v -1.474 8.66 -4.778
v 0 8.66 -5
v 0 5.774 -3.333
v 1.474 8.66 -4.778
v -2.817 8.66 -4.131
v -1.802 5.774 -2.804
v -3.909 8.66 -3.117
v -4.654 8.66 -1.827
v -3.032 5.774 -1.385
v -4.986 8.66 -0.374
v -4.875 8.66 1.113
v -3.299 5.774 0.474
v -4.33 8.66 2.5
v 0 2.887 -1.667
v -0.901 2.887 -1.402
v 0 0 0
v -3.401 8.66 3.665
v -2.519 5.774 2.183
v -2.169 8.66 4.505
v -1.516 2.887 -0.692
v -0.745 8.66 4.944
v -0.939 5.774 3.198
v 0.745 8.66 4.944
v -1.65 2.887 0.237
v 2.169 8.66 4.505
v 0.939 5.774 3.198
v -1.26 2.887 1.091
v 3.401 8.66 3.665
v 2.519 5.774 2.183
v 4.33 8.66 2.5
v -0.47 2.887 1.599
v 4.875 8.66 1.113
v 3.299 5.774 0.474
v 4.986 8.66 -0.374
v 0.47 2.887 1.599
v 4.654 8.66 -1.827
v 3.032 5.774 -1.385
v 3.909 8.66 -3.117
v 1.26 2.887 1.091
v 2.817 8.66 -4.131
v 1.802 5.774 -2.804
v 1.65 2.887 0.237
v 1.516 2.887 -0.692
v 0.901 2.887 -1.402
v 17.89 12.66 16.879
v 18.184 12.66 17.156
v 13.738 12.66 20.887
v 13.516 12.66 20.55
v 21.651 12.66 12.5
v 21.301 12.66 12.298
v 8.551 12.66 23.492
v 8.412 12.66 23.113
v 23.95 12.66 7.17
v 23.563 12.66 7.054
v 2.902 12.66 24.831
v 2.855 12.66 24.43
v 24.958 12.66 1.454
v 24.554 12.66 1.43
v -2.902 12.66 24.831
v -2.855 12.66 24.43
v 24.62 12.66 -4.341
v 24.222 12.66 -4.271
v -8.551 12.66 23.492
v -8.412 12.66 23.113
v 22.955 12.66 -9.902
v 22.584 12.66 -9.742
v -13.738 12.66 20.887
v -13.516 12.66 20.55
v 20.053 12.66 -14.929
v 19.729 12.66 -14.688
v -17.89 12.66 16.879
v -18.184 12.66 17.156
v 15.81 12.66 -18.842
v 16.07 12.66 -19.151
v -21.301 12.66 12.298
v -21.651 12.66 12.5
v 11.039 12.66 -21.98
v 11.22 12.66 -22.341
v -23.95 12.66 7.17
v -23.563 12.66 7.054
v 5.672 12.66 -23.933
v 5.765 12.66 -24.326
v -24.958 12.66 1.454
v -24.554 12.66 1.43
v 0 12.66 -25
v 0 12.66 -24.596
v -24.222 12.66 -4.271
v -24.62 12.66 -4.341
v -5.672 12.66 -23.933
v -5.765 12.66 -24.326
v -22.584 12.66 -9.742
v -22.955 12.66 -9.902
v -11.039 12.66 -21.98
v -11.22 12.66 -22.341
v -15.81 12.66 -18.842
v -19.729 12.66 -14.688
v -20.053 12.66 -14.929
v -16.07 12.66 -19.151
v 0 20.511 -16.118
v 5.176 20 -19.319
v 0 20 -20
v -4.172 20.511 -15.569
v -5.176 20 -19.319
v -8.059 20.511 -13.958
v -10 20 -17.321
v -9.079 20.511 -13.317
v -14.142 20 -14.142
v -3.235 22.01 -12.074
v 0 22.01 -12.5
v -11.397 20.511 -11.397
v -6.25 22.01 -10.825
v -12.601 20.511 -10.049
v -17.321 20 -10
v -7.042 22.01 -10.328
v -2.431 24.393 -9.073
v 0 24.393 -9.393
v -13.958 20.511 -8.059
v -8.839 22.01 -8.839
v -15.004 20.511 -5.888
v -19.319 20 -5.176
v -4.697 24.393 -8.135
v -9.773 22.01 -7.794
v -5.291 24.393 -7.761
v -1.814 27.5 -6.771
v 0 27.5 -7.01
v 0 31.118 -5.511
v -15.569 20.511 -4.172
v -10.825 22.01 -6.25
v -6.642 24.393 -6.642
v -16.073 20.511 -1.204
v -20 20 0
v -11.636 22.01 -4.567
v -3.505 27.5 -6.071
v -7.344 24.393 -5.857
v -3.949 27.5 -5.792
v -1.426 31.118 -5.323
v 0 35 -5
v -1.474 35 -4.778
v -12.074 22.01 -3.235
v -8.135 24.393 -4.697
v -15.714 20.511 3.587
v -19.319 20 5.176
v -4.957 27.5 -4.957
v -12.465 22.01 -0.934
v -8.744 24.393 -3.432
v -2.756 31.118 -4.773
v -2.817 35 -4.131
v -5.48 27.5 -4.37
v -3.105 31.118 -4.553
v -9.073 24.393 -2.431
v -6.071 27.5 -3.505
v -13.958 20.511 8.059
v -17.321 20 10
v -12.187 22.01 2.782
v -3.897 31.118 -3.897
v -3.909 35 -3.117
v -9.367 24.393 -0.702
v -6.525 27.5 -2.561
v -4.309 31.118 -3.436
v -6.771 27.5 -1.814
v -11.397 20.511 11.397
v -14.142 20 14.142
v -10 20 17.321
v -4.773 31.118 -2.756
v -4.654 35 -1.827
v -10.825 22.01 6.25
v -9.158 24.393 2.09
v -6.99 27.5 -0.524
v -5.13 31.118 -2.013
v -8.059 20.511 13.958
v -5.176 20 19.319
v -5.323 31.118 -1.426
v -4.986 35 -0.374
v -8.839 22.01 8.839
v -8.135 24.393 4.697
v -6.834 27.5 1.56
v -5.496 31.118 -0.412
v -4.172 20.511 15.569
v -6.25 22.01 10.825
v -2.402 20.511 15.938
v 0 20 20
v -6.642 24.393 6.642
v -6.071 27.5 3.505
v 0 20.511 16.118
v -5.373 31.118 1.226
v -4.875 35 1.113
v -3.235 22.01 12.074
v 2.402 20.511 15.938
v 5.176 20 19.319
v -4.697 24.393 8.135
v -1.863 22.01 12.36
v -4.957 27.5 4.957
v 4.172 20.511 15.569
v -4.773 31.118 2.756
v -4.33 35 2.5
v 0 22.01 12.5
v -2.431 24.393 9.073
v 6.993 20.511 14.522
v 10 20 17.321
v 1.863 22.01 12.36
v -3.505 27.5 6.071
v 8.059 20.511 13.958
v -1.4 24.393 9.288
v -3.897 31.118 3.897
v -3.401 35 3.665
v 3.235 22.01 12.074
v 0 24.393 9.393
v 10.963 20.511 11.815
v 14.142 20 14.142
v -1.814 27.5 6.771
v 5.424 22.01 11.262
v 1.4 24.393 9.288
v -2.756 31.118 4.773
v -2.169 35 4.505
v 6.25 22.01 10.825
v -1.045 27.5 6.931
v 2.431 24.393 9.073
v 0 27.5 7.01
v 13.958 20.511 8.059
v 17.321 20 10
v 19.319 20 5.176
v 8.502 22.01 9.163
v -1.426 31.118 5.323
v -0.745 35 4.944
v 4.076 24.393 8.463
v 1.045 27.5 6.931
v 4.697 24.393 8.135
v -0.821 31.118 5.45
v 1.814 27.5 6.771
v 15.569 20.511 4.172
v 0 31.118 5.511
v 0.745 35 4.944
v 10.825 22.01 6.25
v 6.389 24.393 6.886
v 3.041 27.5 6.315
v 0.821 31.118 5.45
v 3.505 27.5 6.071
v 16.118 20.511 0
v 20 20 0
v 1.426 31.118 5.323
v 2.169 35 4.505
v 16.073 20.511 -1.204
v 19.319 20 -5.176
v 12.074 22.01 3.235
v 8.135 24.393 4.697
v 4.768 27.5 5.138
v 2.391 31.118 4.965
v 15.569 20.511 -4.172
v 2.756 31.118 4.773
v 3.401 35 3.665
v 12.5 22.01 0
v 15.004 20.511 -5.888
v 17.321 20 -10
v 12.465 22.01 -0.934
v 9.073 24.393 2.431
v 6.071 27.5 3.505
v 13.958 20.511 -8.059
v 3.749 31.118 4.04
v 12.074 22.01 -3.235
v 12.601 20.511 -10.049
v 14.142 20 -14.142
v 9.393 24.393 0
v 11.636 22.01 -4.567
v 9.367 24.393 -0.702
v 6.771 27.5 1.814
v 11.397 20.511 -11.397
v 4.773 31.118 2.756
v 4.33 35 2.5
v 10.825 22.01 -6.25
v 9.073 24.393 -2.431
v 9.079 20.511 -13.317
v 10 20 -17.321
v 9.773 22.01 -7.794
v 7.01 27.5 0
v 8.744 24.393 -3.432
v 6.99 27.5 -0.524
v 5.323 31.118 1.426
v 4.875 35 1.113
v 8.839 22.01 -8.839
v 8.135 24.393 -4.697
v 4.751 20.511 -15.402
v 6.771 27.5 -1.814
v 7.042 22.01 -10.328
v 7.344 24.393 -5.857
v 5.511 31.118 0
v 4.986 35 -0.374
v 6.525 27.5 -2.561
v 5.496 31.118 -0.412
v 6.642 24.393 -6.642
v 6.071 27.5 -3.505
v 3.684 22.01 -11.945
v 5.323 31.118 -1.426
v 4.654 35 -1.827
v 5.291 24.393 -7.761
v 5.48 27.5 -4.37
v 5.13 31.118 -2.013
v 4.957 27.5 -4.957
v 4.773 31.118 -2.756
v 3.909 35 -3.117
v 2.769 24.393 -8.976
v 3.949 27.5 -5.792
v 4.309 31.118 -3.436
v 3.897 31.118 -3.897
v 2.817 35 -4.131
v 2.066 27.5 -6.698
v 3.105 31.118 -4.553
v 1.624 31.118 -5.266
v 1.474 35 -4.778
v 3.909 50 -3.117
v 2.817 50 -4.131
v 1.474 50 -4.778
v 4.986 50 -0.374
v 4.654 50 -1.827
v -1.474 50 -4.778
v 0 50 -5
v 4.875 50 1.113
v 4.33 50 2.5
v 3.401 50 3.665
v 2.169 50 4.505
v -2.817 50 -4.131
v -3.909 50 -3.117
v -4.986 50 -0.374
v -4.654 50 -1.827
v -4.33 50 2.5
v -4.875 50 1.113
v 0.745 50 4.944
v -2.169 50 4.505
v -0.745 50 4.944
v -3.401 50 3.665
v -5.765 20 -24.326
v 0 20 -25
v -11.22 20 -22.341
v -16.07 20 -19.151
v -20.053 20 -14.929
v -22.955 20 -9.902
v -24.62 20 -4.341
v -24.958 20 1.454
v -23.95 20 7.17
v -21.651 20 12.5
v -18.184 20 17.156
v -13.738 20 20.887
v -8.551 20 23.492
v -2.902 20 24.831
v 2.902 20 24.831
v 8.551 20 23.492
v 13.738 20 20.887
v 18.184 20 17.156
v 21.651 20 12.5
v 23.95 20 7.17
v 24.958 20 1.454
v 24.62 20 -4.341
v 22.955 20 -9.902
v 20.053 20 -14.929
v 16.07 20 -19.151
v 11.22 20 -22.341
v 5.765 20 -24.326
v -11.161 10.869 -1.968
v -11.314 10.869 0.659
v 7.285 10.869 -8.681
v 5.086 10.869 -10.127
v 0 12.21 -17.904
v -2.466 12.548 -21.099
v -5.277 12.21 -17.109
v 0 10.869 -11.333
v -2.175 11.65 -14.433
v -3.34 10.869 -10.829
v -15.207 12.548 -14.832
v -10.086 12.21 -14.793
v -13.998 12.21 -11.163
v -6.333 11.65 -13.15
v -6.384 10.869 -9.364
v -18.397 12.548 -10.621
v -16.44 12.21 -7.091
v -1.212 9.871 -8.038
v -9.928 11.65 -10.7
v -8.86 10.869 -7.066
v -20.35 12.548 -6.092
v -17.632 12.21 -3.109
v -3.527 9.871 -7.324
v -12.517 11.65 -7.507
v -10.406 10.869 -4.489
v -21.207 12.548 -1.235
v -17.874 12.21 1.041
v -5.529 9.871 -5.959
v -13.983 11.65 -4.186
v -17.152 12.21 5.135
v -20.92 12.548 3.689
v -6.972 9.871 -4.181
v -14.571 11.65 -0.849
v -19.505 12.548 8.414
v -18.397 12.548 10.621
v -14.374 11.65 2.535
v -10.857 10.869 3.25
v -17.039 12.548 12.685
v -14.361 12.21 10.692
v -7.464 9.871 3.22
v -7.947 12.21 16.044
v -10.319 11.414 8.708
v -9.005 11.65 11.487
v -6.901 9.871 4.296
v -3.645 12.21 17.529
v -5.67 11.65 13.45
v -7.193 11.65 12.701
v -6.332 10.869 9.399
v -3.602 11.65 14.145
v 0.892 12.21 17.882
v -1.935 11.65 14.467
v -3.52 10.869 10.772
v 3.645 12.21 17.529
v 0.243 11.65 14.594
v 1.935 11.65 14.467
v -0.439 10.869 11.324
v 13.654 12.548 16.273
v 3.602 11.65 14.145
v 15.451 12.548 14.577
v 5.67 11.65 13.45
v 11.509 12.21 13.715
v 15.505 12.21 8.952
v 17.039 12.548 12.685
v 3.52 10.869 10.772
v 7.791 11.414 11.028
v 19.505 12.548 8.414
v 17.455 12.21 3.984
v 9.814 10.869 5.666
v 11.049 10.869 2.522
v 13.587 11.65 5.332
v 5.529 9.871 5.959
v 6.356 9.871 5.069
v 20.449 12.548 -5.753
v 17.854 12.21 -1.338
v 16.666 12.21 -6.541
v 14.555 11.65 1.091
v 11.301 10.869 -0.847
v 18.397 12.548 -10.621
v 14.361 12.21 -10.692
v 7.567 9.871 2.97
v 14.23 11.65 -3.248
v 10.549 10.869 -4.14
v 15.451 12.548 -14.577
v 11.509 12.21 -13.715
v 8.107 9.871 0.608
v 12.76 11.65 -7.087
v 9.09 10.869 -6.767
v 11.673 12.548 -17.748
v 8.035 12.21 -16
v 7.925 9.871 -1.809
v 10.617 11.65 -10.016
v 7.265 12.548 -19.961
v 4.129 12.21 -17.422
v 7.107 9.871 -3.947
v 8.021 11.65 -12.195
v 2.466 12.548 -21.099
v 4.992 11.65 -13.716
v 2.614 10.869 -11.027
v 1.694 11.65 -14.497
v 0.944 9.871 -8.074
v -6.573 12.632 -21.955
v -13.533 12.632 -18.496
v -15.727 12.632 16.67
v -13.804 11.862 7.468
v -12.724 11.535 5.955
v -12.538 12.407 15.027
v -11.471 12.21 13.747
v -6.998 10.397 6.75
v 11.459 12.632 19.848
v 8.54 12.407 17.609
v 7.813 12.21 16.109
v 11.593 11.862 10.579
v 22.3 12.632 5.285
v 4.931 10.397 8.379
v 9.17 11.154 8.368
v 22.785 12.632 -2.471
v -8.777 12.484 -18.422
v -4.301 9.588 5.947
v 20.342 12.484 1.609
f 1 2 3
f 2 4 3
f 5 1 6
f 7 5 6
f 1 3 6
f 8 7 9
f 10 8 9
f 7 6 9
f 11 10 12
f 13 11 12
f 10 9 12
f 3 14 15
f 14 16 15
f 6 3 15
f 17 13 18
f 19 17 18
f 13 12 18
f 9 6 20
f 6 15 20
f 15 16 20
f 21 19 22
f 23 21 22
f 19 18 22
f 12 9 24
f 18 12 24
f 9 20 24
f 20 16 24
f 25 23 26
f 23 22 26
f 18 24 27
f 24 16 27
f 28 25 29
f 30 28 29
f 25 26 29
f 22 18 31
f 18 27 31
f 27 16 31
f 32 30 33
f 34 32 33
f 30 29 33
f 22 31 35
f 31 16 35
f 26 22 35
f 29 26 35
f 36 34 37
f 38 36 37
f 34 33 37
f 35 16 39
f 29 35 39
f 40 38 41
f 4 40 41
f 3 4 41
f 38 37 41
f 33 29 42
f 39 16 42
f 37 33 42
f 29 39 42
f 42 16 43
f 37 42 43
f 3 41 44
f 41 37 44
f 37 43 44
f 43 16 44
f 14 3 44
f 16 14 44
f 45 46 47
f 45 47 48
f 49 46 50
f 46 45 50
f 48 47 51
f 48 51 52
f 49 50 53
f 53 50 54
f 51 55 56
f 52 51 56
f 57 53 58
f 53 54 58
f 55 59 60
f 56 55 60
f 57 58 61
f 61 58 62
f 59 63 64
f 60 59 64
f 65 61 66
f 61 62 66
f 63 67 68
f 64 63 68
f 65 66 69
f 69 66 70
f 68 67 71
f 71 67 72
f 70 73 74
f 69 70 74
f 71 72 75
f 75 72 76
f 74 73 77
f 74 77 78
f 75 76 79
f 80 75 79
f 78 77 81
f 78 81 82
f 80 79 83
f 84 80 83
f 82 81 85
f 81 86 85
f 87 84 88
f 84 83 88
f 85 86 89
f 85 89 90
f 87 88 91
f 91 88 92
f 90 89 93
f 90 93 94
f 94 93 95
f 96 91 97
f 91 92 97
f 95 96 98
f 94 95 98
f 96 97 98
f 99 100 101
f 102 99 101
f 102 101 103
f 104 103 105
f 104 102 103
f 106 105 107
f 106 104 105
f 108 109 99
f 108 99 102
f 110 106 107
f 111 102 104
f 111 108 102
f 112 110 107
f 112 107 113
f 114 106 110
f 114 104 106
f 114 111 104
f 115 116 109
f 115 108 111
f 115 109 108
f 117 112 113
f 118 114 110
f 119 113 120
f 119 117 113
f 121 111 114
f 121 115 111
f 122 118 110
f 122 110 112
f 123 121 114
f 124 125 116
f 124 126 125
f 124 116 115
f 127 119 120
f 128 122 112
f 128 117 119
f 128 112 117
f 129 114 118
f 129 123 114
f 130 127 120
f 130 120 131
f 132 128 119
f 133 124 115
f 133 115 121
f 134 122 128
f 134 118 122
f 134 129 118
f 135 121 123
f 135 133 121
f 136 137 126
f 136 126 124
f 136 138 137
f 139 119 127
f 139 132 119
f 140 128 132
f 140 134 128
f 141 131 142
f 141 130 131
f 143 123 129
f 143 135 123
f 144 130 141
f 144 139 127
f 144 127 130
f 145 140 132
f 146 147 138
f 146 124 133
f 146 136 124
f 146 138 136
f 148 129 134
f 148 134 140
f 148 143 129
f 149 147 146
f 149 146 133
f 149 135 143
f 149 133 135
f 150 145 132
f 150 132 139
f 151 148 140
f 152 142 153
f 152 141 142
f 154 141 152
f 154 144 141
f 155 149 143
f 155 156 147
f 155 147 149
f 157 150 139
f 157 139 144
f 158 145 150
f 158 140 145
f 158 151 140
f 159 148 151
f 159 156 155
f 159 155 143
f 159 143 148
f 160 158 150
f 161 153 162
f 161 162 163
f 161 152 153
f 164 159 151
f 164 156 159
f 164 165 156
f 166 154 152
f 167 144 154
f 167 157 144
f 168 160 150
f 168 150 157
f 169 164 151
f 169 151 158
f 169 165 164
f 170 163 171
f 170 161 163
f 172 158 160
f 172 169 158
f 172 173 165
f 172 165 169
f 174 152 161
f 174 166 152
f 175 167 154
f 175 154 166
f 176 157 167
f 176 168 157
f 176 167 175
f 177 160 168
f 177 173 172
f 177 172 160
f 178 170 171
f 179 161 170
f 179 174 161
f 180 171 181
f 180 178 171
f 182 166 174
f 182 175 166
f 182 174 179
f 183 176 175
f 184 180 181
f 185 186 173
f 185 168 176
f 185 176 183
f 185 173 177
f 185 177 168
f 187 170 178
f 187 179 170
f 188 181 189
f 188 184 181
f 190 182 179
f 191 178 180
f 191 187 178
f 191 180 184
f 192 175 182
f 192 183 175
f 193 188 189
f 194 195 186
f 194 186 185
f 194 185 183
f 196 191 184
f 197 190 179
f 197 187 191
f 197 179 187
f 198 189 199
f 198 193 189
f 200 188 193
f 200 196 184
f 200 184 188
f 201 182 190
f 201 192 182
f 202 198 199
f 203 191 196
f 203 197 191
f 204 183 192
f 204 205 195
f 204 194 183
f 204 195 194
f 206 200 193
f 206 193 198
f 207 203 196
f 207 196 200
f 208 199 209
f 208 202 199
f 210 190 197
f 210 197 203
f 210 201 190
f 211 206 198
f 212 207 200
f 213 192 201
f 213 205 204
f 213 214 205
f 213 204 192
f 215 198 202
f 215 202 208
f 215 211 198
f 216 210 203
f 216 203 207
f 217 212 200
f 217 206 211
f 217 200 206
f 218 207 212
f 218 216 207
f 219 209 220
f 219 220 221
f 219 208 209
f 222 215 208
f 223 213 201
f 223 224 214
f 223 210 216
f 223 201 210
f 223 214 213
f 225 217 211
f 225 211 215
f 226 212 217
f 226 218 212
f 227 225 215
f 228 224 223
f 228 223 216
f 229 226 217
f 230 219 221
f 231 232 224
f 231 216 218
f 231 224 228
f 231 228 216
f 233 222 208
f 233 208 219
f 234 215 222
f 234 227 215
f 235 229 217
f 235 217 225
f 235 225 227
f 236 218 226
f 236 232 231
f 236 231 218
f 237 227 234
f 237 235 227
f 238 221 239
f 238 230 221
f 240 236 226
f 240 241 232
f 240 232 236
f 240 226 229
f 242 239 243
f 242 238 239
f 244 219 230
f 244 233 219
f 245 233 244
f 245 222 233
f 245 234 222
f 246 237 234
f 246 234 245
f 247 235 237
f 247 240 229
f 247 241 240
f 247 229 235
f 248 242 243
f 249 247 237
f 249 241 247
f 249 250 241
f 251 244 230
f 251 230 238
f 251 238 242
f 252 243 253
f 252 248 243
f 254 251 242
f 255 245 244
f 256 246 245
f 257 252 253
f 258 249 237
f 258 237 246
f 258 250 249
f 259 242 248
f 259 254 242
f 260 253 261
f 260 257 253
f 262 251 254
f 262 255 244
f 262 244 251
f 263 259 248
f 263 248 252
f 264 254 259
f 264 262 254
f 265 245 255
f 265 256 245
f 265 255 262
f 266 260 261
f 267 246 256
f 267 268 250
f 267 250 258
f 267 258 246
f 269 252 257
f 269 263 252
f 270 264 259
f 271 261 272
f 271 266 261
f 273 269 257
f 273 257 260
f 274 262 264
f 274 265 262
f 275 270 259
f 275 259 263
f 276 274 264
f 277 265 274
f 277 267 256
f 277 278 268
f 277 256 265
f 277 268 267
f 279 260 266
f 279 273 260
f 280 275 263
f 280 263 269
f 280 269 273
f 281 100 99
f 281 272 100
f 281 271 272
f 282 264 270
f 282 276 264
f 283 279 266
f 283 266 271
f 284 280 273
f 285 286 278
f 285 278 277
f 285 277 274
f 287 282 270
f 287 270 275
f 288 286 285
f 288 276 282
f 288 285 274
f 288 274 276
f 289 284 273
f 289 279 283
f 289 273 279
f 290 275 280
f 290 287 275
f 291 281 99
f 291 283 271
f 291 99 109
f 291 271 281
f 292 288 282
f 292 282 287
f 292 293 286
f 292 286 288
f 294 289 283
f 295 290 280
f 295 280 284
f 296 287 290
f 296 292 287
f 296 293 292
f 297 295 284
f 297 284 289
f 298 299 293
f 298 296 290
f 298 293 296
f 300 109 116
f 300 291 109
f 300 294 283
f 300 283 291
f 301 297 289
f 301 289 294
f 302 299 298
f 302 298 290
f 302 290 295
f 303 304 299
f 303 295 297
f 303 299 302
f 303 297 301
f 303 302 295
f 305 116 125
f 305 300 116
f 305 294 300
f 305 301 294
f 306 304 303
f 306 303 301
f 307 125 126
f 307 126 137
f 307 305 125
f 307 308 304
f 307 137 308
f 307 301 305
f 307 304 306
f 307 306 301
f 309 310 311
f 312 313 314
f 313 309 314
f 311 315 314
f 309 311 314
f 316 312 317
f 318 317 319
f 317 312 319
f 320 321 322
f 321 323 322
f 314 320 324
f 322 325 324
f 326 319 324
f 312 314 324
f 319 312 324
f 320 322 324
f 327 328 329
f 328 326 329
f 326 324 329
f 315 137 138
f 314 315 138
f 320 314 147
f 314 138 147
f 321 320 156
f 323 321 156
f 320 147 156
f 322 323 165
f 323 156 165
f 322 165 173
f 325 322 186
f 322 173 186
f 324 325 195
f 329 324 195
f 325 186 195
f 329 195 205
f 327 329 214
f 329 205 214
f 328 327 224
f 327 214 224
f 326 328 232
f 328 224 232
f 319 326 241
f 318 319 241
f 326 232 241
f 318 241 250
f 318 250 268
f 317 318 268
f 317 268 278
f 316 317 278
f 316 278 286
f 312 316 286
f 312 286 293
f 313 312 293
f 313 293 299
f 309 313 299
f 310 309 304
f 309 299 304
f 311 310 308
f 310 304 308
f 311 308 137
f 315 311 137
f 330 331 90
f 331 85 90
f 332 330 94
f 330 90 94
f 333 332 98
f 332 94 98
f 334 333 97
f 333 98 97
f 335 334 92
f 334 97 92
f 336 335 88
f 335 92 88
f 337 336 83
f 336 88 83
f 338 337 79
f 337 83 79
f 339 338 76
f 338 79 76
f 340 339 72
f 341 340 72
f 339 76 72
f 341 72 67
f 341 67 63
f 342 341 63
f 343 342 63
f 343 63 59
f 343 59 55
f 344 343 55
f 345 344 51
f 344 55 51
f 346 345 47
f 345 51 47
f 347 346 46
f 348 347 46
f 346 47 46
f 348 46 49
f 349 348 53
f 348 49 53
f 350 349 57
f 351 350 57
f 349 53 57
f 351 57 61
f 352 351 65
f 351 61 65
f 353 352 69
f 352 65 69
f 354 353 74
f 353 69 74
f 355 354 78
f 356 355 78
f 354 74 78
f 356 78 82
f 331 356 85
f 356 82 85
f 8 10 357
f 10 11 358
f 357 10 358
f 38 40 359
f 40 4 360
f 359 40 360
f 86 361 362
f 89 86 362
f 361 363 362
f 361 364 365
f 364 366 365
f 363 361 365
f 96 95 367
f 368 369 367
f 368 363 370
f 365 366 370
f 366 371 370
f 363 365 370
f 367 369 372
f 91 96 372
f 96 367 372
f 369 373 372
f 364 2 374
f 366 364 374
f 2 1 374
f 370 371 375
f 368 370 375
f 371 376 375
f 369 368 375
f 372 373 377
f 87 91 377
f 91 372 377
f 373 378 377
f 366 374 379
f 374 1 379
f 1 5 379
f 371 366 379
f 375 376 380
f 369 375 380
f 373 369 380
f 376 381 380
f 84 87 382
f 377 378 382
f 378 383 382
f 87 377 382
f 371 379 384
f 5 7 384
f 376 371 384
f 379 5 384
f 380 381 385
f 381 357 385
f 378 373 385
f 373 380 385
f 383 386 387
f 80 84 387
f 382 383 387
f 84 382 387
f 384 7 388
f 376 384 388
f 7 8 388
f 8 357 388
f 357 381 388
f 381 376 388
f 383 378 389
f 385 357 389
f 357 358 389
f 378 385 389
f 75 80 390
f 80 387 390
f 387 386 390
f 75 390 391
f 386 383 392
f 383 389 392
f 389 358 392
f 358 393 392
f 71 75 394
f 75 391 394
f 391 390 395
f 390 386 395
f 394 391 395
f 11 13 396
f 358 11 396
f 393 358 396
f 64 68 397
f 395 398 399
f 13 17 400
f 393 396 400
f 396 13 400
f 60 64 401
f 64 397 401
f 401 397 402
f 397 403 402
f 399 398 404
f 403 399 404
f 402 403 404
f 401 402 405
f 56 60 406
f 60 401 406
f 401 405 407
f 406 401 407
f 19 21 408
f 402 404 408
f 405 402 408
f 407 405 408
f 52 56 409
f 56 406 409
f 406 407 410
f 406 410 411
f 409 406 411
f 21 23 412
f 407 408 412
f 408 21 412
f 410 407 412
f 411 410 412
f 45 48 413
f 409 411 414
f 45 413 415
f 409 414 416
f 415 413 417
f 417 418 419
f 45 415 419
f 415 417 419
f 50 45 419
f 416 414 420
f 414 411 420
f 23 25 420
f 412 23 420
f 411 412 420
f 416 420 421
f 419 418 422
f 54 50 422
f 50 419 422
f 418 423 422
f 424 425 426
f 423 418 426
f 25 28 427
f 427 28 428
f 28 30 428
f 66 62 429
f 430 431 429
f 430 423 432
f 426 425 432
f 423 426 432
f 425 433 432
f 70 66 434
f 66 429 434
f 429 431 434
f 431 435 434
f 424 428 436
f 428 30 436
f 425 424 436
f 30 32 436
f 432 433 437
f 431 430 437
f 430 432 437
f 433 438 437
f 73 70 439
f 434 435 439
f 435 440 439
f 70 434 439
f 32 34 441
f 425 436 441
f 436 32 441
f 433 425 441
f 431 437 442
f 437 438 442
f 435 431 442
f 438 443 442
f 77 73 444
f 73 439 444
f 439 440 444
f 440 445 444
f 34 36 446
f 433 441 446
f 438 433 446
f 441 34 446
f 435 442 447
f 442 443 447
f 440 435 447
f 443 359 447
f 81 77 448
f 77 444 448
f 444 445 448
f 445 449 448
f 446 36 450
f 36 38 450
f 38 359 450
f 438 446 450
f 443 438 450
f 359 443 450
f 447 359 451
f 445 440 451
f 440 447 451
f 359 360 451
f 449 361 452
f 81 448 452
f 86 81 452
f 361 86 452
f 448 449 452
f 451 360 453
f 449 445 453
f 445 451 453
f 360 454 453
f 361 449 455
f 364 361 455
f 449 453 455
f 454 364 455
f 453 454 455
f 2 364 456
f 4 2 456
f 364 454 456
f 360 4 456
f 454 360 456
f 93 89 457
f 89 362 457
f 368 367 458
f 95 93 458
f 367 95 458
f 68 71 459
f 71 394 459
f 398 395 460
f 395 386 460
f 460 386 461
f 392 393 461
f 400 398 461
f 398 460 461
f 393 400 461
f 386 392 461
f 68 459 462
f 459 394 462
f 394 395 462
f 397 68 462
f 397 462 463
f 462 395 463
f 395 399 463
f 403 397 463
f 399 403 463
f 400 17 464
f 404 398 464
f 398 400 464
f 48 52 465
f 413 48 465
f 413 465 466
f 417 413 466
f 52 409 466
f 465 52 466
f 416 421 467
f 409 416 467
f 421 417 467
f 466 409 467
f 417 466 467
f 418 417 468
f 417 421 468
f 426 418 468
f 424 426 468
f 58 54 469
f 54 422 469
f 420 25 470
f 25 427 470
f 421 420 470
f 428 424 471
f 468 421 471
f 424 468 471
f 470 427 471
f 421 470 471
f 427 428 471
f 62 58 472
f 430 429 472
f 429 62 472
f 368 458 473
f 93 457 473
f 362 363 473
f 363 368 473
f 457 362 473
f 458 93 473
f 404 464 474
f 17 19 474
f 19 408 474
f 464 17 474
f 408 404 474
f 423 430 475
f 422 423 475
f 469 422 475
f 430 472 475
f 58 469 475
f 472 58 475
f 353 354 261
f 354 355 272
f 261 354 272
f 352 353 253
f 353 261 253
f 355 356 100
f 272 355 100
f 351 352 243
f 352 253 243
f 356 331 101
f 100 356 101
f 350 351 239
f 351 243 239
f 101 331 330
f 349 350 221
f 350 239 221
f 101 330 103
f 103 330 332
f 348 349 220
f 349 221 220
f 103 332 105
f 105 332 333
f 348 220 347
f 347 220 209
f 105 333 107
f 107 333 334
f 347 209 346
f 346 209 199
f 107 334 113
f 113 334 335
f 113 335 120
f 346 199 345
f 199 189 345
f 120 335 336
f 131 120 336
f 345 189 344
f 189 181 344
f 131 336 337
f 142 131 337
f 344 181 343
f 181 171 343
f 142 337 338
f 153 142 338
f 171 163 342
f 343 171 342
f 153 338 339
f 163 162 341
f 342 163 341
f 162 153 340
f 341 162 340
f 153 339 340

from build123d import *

# Parameters (mm, degrees)
FILLET1_R = 50
FILLET2_R = 15


with BuildPart() as part:
    # Sketch2 → Revolve1 (revolve)
    with BuildSketch(Plane(origin=(0, 0, 0), x_dir=(0, 0, -1), z_dir=(1, 0, 0))):
        Polygon((0, 0), (0, 50), (5, 50), (5, 20), (25, 20), (25, 12.660254038), (5, 12.660254038), (5, 8.660254038), align=None)
    revolve(axis=Axis((0, 0, 0), (0, 1, 0)))

    # Fillet1
    # the kernel refuses this fillet: 50 mm, written as the material it adds along each edge
    with BuildSketch(Plane(origin=(0, 12.660254038, 0), x_dir=(0, 0, -1), z_dir=(1, 0, 0))) as fillet1_piece_1:
        with BuildLine():
            CenterArc((24.595917942, -50), FILLET1_R, 90, 23.073918066)
            Line((5, -4), (5, 0))
            Line((5, 0), (24.595917942, 0))
        make_face()
    revolve(axis=Axis((0, 12.660254038, 0), (0, 1, 0)))

    # Fillet2
    fillet2_edges = [part.edges().sort_by_distance(p)[0] for p in [
        (0, 20, 5),
    ]]
    fillet(fillet2_edges, radius=FILLET2_R)


solid = part.part
